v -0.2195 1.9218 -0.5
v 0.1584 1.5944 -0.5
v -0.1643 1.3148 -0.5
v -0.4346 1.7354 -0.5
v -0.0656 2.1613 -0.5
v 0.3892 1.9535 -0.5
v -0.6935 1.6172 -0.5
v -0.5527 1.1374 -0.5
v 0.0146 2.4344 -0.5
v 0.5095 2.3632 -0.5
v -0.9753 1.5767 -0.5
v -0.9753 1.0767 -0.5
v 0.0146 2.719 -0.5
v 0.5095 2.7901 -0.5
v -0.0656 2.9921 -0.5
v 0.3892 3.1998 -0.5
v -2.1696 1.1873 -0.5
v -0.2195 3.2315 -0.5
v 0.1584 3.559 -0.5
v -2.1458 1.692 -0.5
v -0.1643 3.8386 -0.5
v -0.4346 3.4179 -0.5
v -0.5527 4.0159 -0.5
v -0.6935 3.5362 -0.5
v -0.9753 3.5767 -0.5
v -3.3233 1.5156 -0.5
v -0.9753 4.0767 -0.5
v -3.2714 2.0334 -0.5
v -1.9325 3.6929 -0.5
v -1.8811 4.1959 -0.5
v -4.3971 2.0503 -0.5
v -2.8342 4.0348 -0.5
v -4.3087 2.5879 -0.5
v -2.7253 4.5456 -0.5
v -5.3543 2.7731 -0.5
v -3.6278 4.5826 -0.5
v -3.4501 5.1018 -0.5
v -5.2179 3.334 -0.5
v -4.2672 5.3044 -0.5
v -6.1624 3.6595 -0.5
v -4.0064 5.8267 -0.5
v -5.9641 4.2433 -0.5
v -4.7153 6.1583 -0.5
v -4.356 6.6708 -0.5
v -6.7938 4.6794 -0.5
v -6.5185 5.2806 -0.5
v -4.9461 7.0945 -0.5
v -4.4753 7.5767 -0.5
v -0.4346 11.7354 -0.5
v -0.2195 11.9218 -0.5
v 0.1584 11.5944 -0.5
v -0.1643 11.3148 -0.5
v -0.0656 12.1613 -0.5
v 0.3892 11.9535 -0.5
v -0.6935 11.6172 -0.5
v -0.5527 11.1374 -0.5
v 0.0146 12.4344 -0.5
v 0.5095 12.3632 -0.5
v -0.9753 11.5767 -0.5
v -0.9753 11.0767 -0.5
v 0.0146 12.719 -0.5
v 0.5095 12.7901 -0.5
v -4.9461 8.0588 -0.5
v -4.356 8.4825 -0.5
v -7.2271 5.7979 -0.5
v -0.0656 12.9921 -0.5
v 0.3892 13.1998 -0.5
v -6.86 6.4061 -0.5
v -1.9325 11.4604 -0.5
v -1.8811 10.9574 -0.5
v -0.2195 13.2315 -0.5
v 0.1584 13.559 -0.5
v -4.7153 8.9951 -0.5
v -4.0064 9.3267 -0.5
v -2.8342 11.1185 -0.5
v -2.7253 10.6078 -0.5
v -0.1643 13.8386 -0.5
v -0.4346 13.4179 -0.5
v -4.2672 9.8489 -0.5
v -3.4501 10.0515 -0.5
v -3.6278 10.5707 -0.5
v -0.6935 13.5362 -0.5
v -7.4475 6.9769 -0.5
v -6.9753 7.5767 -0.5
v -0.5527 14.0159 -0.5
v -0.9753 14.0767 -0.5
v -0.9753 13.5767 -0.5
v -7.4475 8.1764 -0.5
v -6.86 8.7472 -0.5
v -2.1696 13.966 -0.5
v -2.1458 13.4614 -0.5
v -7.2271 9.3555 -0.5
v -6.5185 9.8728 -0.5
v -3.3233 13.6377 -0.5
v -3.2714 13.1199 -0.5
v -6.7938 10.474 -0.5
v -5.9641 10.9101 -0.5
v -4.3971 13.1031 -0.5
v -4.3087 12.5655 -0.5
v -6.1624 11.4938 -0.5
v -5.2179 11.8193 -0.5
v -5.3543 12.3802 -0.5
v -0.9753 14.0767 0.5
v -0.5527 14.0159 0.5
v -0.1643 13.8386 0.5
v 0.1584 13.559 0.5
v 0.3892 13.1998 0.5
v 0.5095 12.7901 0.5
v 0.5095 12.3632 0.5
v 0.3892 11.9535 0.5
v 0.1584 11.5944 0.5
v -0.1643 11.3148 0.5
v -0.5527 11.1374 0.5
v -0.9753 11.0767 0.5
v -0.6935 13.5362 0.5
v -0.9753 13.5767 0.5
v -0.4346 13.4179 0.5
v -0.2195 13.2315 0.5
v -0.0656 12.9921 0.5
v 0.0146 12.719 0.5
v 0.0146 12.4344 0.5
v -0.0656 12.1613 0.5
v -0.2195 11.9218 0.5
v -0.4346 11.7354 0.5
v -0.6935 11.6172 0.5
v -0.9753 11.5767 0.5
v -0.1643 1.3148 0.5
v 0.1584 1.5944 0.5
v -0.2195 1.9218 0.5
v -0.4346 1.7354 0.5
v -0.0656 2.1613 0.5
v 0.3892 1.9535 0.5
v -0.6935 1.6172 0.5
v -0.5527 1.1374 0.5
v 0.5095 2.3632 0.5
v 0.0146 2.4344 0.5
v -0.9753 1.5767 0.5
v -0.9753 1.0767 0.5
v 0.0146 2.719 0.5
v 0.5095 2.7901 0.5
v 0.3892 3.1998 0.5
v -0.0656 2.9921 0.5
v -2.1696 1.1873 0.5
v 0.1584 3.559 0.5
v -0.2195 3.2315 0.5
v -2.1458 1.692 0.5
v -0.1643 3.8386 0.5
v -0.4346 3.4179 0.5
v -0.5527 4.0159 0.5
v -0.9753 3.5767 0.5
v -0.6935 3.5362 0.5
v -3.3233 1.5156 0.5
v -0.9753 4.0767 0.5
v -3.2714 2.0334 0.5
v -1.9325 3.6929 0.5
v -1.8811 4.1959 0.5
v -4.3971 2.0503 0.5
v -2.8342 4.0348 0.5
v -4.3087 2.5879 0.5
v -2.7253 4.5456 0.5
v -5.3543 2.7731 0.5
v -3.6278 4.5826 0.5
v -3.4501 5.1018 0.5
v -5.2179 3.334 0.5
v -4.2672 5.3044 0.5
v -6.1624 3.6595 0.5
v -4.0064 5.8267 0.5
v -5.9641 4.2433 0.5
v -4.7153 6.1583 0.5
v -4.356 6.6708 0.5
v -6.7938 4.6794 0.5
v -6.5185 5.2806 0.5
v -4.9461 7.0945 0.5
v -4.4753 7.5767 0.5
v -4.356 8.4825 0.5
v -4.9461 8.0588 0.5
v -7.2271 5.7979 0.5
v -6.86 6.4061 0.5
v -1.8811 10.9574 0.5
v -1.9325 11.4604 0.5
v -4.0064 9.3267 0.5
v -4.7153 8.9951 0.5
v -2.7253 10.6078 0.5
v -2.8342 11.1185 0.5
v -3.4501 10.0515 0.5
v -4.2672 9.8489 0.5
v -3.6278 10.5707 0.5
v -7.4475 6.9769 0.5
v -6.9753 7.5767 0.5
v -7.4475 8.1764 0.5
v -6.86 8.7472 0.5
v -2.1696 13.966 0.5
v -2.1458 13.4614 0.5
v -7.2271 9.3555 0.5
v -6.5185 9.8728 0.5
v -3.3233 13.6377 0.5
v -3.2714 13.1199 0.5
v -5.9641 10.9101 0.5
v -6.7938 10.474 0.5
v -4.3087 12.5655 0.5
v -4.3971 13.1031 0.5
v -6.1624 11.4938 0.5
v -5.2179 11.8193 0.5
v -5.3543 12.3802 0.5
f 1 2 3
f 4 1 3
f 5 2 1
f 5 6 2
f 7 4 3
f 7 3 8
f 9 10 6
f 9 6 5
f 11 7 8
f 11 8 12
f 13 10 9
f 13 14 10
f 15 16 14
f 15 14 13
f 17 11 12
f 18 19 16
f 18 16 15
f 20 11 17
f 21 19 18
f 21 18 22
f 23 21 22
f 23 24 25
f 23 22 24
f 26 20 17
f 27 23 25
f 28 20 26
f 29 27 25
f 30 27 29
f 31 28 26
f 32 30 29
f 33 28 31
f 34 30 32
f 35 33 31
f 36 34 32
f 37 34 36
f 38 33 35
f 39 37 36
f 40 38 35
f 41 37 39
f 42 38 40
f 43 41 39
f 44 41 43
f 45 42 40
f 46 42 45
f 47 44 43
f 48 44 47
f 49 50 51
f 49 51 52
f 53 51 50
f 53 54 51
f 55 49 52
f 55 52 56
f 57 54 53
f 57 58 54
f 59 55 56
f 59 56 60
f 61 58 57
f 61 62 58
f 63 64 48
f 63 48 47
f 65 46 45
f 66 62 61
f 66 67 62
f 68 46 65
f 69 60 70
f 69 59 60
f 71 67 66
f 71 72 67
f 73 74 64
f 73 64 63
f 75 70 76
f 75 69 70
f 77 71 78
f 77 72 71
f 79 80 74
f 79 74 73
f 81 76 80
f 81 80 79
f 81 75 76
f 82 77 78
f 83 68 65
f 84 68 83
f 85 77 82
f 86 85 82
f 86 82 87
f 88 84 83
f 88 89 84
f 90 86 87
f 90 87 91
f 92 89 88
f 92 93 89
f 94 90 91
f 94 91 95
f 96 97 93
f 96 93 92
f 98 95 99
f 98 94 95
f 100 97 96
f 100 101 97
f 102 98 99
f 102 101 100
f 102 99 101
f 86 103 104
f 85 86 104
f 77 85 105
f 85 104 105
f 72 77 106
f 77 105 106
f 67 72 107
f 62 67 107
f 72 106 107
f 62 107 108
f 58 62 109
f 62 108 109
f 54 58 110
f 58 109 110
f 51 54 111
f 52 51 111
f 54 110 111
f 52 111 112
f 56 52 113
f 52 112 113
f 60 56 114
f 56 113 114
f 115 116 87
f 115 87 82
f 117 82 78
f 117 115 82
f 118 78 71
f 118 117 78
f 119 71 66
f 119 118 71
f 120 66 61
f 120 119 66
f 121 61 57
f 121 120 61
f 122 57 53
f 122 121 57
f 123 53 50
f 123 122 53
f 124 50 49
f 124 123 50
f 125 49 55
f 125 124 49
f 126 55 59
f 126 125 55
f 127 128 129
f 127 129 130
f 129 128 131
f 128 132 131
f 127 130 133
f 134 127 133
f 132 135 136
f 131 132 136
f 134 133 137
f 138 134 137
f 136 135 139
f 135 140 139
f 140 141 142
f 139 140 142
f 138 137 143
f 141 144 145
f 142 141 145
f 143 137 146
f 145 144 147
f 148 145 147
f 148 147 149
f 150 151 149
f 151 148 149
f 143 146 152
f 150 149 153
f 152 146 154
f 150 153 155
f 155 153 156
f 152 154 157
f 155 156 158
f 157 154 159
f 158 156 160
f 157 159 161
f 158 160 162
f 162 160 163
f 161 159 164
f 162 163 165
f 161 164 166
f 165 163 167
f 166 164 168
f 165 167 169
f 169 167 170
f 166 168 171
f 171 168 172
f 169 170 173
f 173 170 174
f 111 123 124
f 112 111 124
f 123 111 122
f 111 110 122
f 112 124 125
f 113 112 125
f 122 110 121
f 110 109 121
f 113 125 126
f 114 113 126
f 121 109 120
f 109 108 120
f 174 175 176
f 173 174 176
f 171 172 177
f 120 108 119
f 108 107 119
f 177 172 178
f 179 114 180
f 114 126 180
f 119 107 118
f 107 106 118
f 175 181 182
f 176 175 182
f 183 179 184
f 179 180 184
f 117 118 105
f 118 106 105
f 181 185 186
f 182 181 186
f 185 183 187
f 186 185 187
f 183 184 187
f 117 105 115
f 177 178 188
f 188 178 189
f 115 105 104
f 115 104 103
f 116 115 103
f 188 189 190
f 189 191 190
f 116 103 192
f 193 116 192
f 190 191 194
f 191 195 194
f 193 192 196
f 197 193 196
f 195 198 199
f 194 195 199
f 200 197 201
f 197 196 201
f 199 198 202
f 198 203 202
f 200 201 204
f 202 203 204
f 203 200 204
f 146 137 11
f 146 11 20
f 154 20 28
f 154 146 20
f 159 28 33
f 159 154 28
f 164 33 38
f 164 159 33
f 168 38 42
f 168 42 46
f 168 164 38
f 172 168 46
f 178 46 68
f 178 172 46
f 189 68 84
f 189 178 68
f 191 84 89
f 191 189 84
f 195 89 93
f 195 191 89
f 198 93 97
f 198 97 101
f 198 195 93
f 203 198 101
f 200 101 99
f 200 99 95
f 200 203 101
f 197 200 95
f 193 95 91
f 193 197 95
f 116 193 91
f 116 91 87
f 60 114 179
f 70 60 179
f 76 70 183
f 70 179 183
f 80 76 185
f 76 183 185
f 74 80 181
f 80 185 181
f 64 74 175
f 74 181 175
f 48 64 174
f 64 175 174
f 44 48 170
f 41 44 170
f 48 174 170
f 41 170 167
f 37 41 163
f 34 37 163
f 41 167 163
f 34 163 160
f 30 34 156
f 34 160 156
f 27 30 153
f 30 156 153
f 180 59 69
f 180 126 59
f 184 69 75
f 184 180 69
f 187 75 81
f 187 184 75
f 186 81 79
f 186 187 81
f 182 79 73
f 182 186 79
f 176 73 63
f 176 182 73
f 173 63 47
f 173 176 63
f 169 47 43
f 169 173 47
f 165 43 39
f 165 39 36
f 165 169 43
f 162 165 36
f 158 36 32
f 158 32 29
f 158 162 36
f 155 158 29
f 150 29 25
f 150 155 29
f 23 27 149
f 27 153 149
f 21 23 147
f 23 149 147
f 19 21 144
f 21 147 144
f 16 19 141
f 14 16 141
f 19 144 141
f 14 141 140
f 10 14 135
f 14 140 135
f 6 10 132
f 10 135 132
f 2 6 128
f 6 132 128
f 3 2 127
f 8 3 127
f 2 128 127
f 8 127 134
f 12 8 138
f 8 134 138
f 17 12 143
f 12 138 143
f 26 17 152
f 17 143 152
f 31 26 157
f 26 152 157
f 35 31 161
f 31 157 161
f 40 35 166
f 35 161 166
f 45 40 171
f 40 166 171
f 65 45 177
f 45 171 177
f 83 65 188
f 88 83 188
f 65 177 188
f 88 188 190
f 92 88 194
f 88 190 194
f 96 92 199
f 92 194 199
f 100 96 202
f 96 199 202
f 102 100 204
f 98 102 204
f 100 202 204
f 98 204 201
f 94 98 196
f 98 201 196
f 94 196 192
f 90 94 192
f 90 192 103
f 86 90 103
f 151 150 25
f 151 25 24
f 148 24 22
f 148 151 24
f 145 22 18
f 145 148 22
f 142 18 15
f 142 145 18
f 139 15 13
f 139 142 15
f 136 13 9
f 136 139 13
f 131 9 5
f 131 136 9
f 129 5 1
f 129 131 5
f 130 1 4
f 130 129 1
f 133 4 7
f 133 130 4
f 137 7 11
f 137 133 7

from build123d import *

# Parameters (mm, degrees)
EXTRUDE_1_DEPTH = 0.5


with BuildPart() as part:
    # 草图1 → 凸台-拉伸1 (new, symmetric)
    with BuildSketch(Plane.XY):
        with BuildLine():
            ThreePointArc((-0.975265745, 11.076672173), (-4.475265745, 7.576672173), (-0.975265745, 4.076672173))
            ThreePointArc((-0.975265745, 4.076672173), (0.524734255, 2.576672173), (-0.975265745, 1.076672173))
            ThreePointArc((-0.975265745, 1.076672173), (-7.475265745, 7.576672173), (-0.975265745, 14.076672173))
            ThreePointArc((-0.975265745, 14.076672173), (0.524734255, 12.576672173), (-0.975265745, 11.076672173))
        make_face()
        with BuildLine():
            ThreePointArc((-0.975265745, 11.576672173), (-4.975265745, 7.576672173), (-0.975265745, 3.576672173))
            ThreePointArc((-0.975265745, 3.576672173), (0.024734255, 2.576672173), (-0.975265745, 1.576672173))
            ThreePointArc((-0.975265745, 1.576672173), (-6.975265745, 7.576672173), (-0.975265745, 13.576672173))
            ThreePointArc((-0.975265745, 13.576672173), (0.024734255, 12.576672173), (-0.975265745, 11.576672173))
        make_face(mode=Mode.SUBTRACT)
    extrude(amount=EXTRUDE_1_DEPTH, both=True)


solid = part.part
